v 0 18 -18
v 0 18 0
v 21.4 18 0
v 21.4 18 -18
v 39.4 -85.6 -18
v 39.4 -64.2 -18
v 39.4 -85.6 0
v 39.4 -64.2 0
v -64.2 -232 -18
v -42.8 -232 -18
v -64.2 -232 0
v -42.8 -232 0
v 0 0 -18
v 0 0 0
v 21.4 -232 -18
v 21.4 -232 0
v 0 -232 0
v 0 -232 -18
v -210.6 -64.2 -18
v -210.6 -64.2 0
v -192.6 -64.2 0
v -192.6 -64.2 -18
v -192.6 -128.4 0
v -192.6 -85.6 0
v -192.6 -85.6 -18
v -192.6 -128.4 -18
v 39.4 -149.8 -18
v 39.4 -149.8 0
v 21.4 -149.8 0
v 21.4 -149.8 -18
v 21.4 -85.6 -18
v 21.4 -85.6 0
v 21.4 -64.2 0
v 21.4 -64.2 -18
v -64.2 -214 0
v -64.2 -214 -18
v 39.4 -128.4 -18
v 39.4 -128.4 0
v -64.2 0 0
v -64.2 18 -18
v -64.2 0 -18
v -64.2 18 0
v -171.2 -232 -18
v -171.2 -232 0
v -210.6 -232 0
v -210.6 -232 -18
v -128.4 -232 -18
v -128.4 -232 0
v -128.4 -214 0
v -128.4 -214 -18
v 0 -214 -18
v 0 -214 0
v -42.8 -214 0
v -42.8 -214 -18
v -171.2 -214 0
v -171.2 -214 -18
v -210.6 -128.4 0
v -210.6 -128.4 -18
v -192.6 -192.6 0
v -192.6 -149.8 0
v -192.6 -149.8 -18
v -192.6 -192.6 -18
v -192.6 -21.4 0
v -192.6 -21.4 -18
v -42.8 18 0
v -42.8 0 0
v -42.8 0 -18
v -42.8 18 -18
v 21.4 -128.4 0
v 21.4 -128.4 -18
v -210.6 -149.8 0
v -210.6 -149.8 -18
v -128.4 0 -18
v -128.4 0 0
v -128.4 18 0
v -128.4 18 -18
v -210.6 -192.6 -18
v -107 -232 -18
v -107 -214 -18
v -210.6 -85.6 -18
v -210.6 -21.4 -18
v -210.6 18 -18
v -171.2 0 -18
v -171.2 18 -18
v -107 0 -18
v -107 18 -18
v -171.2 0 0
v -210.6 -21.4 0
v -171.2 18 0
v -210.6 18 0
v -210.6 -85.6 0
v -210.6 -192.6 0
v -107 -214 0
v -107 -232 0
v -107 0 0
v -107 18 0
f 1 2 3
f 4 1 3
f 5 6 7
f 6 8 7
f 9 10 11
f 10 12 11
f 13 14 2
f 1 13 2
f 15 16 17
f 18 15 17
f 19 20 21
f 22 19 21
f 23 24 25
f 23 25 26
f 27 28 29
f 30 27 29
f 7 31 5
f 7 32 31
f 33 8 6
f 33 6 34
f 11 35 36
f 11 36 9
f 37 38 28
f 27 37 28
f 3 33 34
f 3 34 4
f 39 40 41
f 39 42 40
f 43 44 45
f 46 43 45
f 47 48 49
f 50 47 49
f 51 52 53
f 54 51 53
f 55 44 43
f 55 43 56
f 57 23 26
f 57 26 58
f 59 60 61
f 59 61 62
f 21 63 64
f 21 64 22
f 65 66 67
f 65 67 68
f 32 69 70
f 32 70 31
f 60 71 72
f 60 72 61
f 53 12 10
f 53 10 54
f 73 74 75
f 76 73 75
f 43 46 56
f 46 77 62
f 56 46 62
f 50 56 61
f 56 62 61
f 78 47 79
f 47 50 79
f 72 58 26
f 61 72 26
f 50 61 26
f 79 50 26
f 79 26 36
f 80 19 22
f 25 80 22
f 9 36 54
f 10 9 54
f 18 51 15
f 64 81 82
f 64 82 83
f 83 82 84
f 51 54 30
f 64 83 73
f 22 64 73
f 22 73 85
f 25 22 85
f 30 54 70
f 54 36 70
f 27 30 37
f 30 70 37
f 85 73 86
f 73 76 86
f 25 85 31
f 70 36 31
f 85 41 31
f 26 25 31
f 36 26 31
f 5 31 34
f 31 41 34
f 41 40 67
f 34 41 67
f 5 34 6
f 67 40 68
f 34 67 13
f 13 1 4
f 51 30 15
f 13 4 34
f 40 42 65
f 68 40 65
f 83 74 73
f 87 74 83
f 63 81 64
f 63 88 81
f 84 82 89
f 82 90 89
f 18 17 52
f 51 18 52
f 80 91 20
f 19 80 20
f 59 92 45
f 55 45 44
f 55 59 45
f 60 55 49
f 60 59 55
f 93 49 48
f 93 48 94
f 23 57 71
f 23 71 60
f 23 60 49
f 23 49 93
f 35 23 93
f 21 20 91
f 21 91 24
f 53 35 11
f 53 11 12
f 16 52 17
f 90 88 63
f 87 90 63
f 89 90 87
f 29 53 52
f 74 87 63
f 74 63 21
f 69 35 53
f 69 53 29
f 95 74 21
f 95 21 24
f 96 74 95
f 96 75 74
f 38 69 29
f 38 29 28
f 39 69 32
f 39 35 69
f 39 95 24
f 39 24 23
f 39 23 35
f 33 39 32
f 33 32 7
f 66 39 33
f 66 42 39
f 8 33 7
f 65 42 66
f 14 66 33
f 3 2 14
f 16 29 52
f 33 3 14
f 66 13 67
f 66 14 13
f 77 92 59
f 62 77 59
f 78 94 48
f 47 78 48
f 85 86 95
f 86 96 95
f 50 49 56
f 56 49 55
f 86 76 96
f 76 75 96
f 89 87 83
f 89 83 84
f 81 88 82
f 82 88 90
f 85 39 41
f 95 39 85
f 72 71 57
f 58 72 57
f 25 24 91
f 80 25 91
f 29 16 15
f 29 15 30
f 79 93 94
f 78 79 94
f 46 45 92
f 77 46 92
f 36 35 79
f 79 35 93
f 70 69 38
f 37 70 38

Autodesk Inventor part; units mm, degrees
ref_plane "YZ Plane" through (0, 0, 0) normal (1, 0, 0) x (0, 1, 0)
ref_plane "XZ Plane" through (0, 0, 0) normal (0, 1, 0) x (-1, 0, 0)
ref_plane "XY Plane" through (0, 0, 0) normal (0, 0, 1) x (1, 0, 0)
sketch "Sketch1" plane through (0, 0, 0) normal (0, 0, 1) x (1, 0, 0)
  line L0 (-210.6, 18) -> (39.4, 18)
  line L1 (39.4, 18) -> (39.4, -232)
  line L2 (39.4, -232) -> (-210.6, -232)
  line L3 (-210.6, -232) -> (-210.6, 18)
  line L4 (21.4, -214) -> (21.4, 0)
  line L5 (21.4, -214) -> (-192.6, -214)
  line L6 (-192.6, -214) -> (21.4, -214)
  line L7 (39.4, 0) -> (39.4, -21.4)
  line L8 (39.4, -21.4) -> (21.4, -21.4)
  line L9 (21.4, -21.4) -> (21.4, 0)
  line L10 (39.4, -64.2) -> (21.4, -64.2)
  line L11 (21.4, -64.2) -> (21.4, -85.6)
  line L12 (21.4, -85.6) -> (39.4, -85.6)
  line L13 (21.4, -128.4) -> (39.4, -128.4)
  line L14 (39.4, -149.8) -> (21.4, -149.8)
  line L15 (39.4, -192.6) -> (21.4, -192.6)
  line L16 (-210.6, 18) -> (-210.6, 0)
  line L17 (21.4, 0) -> (21.4, 18)
  line L18 (-210.6, -192.6) -> (-192.6, -192.6)
  line L19 (-210.6, -149.8) -> (-192.6, -149.8)
  line L20 (-192.6, -128.4) -> (-210.6, -128.4)
  line L21 (-192.6, -85.6) -> (-210.6, -85.6)
  line L22 (-210.6, -64.2) -> (-192.6, -64.2)
  line L23 (-210.6, -21.4) -> (-192.6, -21.4)
  line L24 (-64.2, -214) -> (-64.2, -232)
  line L25 (-107, -214) -> (-107, -232)
  line L26 (-128.4, -232) -> (-128.4, -214)
  line L27 (-171.2, -232) -> (-171.2, -214)
  line L28 (-42.8, -232) -> (-42.8, -214)
  line L29 (0, -232) -> (0, -214)
  line L30 (-64.2, 18) -> (-64.2, 0)
  line L31 (-42.8, 0) -> (-42.8, 18)
  line L32 (0, 0) -> (0, 18)
  line L33 (-128.4, 0) -> (-128.4, 18)
  line L34 (-171.2, 0) -> (-171.2, 18)
  line L35 (-107, 18) -> (-107, 0)
  line L36 (21.4, 0) -> (-192.6, 0)
  line L37 (-192.6, 0) -> (-192.6, -214)
  line L38 (21.4, -214) -> (21.4, -232)
  point P0 (0, 0)
  point P1 (227.0923, 209.5253)
  point P2 (245.0923, 209.5253)
  point P3 (227.0923, 252.3253)
  point P4 (205.6923, 273.7253)
  point P5 (205.6923, 291.7253)
  point P6 (162.8923, 291.7253)
  point P7 (162.8923, 273.7253)
  point P8 (141.4923, 273.7253)
  point P9 (141.4923, 291.7253)
  point P10 (98.6923, 291.7253)
  point P11 (98.6923, 273.7253)
  point P12 (77.2923, 273.7253)
  point P13 (77.2923, 291.7253)
  point P14 (34.4923, 291.7253)
  point P15 (34.4923, 273.7253)
  point P16 (13.0923, 252.3253)
  point P17 (-4.9077, 252.3253)
  point P18 (-4.9077, 209.5253)
  point P19 (13.0923, 209.5253)
  point P20 (13.0923, 188.1253)
  point P21 (-4.9077, 188.1253)
  point P22 (-4.9077, 145.3253)
  point P23 (13.0923, 145.3253)
  point P24 (13.0923, 123.9253)
  point P25 (-4.9077, 123.9253)
  point P26 (-4.9077, 81.1253)
  point P27 (13.0923, 81.1253)
  point P28 (13.0923, 59.7253)
  point P29 (34.4923, 59.7253)
  point P30 (34.4923, 41.7253)
  point P31 (77.2923, 41.7253)
  point P32 (77.2923, 59.7253)
  point P33 (98.6923, 59.7253)
  point P34 (98.6923, 41.7253)
  point P35 (141.4923, 41.7253)
  point P36 (141.4923, 59.7253)
  point P37 (162.8923, 59.7253)
  point P38 (162.8923, 41.7253)
  point P39 (205.6923, 41.7253)
  point P40 (205.6923, 59.7253)
  point P41 (227.0923, 59.7253)
  point P42 (227.0923, 81.1253)
  point P43 (245.0923, 81.1253)
  point P44 (245.0923, 123.9253)
  point P45 (227.0923, 123.9253)
  point P46 (227.0923, 145.3253)
  point P47 (245.0923, 145.3253)
  point P48 (245.0923, 188.1253)
  point P49 (227.0923, 188.1253)
  point P50 (-210.6, -232)
  dimension "d0" = 250
  dimension "d1" = 250
  dimension "d2" = 21.4
extrude "Plate1" add sketch "Sketch1" against normal blind 18 contours L0 L34 L36 L37 L23 L3 | L0 L35 L36 L33 | L36 L4 L5 L37 | L22 L37 L21 L3 | L0 L31 L36 L30 | L20 L37 L19 L3 | L0 L17 L36 L32 | L18 L37 L5 L27 L2 L3 | L10 L1 L12 L4 | L26 L5 L25 L2 | L13 L1 L14 L4 | L24 L5 L28 L2 | L29 L5 L38 L2
equation "\"d3\" = Thickness"
equation "\"BendRadius\" = Thickness"
equation "\"BendReliefWidth\" = Thickness"
equation "\"BendReliefDepth\" = 0.5 * Thickness"
equation "\"CornerReliefSize\" = 4 * Thickness"
equation "\"MinimumRemnant\" = 2 * Thickness"
equation "\"TransitionRadius\" = BendRadius"
equation "\"JacobiRadiusSize\" = BendRadius"
equation "\"GapSize\" = Thickness"
equation "\"Thickness\" = 18"
properties part number "6"
